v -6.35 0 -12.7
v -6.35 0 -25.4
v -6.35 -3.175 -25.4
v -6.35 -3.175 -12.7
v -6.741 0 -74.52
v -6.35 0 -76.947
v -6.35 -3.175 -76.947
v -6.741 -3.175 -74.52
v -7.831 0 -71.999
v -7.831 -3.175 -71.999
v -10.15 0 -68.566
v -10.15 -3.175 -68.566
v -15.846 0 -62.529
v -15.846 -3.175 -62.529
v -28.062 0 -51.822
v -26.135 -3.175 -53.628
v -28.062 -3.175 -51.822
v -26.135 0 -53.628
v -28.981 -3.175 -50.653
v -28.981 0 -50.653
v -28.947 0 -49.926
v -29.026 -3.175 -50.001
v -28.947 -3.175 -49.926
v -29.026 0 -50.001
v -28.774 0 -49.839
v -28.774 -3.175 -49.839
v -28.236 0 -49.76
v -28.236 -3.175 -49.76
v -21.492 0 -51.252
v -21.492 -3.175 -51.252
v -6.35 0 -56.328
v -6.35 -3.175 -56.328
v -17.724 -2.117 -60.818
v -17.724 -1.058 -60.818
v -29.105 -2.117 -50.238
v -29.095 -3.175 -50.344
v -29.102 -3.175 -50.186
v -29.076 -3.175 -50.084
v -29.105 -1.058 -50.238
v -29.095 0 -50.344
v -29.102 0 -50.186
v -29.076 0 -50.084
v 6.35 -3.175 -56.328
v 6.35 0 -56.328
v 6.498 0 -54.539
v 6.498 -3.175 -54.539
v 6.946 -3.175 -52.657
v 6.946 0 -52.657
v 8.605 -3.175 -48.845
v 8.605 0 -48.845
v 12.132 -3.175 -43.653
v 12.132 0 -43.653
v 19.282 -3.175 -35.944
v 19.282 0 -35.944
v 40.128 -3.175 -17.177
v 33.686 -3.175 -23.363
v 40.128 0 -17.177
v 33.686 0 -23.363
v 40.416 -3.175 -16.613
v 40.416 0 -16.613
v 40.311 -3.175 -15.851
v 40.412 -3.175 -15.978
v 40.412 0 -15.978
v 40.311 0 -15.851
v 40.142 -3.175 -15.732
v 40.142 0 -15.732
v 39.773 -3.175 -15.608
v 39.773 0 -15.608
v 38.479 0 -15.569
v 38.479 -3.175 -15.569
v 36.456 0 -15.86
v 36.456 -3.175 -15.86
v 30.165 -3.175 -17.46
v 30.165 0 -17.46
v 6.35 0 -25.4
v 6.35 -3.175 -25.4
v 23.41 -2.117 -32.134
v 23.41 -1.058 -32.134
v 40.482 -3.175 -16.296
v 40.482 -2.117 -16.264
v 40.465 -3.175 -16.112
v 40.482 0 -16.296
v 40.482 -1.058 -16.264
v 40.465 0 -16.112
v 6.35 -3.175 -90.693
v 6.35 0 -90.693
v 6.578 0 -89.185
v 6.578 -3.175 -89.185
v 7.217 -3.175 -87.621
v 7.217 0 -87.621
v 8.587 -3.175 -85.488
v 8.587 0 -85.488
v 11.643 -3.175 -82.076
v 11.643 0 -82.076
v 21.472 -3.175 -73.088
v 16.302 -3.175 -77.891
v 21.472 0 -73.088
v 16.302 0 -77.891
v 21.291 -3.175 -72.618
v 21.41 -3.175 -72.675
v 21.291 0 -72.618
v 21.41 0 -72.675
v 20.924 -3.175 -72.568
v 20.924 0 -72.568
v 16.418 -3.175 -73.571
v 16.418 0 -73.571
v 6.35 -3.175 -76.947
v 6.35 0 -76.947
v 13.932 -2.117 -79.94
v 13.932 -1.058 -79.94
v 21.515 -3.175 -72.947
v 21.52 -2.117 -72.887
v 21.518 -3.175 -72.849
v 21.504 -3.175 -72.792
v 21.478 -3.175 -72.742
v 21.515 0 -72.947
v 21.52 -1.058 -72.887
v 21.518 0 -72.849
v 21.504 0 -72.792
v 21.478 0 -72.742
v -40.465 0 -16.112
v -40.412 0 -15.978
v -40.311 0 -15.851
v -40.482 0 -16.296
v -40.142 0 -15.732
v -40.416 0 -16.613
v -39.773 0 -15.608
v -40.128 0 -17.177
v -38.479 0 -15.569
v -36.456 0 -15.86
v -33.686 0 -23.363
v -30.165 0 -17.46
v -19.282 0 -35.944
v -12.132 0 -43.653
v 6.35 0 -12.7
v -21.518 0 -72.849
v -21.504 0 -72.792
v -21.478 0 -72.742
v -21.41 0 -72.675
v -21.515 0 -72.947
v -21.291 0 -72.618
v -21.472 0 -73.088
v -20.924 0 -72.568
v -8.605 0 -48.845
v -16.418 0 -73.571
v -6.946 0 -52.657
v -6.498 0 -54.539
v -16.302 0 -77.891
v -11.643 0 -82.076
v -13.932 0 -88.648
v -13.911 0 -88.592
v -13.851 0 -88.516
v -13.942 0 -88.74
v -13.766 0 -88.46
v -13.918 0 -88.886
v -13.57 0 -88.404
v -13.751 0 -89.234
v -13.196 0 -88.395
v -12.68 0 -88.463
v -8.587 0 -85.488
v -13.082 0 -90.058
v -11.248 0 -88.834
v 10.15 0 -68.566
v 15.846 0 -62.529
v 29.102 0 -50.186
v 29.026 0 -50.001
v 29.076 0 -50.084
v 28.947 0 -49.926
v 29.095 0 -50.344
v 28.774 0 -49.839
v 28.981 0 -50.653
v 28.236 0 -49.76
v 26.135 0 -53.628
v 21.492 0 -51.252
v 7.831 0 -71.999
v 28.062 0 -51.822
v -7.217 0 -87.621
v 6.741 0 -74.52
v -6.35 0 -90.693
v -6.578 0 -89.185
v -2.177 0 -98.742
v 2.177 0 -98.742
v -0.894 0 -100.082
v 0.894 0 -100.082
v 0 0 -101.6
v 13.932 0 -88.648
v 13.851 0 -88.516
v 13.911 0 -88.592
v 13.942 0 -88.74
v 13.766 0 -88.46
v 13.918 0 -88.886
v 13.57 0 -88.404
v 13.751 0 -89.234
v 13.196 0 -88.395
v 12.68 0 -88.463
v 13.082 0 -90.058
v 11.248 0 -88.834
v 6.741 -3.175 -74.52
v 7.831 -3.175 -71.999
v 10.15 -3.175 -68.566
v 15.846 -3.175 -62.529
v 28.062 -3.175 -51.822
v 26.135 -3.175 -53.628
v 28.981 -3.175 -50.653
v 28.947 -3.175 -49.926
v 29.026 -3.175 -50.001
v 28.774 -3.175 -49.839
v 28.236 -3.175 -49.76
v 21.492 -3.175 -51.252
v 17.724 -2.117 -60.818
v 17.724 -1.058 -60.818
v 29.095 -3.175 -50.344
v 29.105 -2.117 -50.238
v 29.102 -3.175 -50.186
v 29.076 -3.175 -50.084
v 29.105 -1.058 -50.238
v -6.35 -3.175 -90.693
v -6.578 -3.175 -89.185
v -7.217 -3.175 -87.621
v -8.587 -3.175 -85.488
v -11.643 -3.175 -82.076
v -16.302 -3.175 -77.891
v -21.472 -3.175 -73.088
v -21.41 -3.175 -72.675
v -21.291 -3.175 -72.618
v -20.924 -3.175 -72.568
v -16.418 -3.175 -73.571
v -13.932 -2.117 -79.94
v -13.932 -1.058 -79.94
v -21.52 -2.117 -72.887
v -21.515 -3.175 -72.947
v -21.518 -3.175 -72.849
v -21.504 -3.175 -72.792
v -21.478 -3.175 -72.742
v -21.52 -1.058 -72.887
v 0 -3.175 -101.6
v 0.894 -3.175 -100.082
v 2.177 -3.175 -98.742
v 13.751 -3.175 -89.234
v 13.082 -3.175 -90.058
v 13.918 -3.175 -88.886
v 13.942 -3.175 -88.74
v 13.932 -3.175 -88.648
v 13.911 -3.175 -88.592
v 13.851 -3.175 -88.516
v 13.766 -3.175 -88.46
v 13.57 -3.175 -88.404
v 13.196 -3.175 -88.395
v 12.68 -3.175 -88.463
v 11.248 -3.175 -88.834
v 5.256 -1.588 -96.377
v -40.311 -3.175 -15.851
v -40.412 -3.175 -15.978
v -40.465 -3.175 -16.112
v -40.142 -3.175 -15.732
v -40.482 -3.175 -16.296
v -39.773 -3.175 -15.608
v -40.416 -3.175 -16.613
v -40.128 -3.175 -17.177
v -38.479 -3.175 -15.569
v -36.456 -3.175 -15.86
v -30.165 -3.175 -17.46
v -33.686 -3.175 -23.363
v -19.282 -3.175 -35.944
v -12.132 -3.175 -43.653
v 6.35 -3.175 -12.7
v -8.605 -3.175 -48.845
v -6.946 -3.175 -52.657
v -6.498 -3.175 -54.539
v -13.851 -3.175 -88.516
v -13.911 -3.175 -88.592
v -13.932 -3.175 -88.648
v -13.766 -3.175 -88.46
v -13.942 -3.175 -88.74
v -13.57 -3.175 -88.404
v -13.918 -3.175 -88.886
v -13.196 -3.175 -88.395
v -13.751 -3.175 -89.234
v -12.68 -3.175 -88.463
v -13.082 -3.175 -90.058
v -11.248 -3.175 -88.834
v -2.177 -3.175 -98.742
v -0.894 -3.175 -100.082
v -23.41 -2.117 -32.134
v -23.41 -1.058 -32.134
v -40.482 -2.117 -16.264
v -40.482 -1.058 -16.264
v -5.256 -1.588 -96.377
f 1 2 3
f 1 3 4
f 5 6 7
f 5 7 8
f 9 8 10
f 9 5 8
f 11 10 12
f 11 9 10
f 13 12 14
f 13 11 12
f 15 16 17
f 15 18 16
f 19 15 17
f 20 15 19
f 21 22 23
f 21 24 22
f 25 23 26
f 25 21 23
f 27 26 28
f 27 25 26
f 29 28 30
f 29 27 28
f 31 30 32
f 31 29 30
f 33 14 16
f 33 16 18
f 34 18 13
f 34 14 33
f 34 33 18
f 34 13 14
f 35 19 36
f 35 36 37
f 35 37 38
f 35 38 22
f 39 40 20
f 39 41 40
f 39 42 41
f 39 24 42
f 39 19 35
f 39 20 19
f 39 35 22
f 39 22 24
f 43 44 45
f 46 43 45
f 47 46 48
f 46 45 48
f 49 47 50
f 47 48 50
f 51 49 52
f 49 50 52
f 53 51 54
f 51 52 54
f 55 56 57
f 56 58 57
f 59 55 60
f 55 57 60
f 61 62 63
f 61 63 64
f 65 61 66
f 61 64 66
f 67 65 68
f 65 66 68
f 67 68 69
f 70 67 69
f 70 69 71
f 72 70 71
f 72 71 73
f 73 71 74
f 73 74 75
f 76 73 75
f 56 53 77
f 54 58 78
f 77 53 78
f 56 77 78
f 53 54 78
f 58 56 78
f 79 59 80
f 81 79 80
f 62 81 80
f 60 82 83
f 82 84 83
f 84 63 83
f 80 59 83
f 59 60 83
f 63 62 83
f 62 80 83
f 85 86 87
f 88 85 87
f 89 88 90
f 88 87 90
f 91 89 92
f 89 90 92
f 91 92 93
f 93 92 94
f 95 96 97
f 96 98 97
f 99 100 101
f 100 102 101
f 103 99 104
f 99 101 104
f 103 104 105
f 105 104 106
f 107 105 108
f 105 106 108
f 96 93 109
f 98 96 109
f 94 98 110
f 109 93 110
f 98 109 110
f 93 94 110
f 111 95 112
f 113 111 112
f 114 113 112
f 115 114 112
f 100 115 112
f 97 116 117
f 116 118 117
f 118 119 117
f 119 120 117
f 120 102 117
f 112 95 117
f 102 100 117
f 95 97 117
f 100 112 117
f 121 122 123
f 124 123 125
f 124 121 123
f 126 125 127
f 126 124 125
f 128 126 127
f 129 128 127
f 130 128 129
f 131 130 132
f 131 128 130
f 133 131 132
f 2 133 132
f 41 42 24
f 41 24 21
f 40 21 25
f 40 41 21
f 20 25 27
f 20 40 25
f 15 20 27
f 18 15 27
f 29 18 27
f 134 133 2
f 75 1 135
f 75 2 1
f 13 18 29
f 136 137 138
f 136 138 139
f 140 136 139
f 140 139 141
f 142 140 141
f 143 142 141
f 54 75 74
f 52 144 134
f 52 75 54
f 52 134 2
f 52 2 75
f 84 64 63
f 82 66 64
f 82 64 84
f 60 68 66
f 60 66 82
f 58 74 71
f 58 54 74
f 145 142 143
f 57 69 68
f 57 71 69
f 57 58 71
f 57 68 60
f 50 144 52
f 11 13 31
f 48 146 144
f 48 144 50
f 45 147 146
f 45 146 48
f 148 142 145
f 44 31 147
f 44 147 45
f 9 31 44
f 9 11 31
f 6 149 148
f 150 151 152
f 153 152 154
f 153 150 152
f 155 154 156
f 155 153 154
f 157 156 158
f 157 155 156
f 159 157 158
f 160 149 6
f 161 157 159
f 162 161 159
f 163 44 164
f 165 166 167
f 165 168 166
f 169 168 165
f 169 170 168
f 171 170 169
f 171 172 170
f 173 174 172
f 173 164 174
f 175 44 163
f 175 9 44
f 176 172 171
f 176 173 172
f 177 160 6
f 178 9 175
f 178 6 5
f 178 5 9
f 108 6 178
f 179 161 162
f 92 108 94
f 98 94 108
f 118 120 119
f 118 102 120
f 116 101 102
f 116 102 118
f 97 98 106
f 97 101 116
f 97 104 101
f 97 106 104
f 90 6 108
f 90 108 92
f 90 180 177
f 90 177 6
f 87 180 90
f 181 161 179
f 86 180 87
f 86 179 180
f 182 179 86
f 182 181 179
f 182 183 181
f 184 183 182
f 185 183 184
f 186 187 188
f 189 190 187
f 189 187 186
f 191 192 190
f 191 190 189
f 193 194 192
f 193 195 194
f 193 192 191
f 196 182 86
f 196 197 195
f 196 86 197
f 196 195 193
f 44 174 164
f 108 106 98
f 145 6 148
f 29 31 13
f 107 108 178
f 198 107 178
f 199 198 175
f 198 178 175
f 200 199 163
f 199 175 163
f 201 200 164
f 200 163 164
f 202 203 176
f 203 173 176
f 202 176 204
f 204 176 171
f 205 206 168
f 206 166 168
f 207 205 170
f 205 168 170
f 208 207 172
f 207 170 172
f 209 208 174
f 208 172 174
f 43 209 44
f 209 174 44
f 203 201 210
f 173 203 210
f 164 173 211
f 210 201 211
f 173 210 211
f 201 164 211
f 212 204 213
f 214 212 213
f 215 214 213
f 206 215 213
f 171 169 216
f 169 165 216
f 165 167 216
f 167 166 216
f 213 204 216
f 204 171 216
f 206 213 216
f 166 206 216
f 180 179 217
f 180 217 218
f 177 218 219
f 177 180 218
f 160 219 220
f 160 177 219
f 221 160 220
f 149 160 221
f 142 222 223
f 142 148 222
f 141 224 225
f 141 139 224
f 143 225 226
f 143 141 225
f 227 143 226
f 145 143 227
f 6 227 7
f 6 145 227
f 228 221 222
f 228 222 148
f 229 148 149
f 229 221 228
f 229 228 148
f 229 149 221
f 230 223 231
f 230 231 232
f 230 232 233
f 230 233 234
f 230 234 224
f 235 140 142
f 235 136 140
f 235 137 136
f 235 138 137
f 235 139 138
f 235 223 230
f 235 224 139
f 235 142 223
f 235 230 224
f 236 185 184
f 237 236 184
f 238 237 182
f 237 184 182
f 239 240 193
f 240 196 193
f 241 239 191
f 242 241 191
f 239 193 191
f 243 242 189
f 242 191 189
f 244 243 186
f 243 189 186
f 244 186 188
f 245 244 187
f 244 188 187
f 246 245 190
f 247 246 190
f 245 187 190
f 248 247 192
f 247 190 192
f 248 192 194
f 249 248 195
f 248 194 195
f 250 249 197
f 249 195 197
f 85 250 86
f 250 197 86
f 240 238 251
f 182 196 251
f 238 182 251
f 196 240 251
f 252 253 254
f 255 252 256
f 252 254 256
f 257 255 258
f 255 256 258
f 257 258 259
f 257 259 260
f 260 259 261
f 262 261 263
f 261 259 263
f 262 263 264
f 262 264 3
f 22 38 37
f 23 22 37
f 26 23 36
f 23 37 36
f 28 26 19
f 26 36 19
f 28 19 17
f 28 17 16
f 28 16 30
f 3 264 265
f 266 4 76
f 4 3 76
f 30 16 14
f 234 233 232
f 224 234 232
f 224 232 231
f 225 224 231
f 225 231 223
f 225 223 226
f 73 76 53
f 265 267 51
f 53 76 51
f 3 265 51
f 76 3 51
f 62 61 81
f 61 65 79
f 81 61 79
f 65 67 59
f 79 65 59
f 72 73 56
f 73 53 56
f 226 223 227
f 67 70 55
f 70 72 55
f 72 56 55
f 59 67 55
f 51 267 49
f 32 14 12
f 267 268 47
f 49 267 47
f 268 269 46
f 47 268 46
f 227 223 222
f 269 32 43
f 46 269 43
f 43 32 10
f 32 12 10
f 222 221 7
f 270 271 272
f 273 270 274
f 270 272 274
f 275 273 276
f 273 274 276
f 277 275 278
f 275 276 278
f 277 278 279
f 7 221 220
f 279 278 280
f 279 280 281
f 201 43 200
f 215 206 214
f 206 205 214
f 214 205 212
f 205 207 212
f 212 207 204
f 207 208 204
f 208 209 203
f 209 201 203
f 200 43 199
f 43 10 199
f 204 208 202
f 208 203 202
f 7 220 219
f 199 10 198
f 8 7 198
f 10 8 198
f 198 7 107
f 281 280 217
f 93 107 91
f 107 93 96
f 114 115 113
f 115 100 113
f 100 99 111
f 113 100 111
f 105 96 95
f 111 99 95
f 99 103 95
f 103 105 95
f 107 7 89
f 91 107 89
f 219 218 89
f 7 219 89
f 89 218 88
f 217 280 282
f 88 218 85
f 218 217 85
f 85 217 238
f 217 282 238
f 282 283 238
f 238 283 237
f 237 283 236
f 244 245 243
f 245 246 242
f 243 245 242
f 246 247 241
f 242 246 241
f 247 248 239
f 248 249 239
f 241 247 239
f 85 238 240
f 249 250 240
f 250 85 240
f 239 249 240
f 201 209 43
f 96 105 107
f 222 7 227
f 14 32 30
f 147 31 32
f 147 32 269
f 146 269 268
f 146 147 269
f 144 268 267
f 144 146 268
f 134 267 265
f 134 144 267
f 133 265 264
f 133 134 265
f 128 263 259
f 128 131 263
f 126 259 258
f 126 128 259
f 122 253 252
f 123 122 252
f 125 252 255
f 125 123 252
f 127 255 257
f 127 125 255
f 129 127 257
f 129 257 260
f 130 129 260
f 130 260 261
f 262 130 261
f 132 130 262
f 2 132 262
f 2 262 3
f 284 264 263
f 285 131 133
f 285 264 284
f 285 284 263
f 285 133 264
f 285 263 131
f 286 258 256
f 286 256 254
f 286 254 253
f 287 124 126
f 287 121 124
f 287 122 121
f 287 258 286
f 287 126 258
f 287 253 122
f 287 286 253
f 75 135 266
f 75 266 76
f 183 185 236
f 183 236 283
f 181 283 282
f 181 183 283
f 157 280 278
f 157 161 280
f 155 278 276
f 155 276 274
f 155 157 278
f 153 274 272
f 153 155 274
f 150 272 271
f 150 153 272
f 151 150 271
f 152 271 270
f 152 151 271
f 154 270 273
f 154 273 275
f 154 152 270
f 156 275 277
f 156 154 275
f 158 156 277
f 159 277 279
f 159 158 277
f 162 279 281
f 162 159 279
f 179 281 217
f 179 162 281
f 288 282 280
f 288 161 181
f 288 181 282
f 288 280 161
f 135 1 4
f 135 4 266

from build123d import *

# Parameters (mm, degrees)
BOSS_EXTRUDE1_DEPTH = 3.175


with BuildPart() as part:
    # Sketch1 → Boss-Extrude1 (new body)
    with BuildSketch(Plane(origin=(0, 0, 0), x_dir=(1, 0, 0), z_dir=(0, 1, 0))):
        with BuildLine():
            Line((-6.35, 12.7), (6.35, 12.7))
            Line((6.35, 12.7), (6.35, 25.4))
            add(Edge.make_bspline(
                [(6.35, 56.328313115), (6.33277042, 33.531169368), (83.156548095, -1.798073983), (6.35, 25.4)],
                knots=[0, 0, 0, 0, 1, 1, 1, 1], degree=3))
            add(Edge.make_bspline(
                [(6.35, 76.947188524), (6.338513613, 61.749092693), (57.554365397, 38.196263793), (6.35, 56.328313115)],
                knots=[0, 0, 0, 0, 1, 1, 1, 1], degree=3))
            add(Edge.make_bspline(
                [(6.35, 90.693105464), (6.342342409, 80.561041577), (40.486243598, 64.859155643), (6.35, 76.947188524)],
                knots=[0, 0, 0, 0, 1, 1, 1, 1], degree=3))
            add(Edge.make_bspline(
                [(0, 101.6), (0.859116351, 99.501641609), (8.04674624, 94.542823282), (20.625145946, 84.684563188), (6.35, 90.693105464)],
                knots=[0, 0, 0, 0, 0.27708829, 1, 1, 1, 1], degree=3))
            add(Edge.make_bspline(
                [(0, 101.6), (-0.859116351, 99.501641609), (-8.04674624, 94.542823282), (-20.625145946, 84.684563188), (-6.35, 90.693105464)],
                knots=[0, 0, 0, 0, 0.27708829, 1, 1, 1, 1], degree=3))
            add(Edge.make_bspline(
                [(-6.35, 90.693105464), (-6.342342409, 80.561041577), (-40.486243598, 64.859155643), (-6.35, 76.947188524)],
                knots=[0, 0, 0, 0, 1, 1, 1, 1], degree=3))
            add(Edge.make_bspline(
                [(-6.35, 76.947188524), (-6.338513613, 61.749092693), (-57.554365397, 38.196263793), (-6.35, 56.328313115)],
                knots=[0, 0, 0, 0, 1, 1, 1, 1], degree=3))
            add(Edge.make_bspline(
                [(-6.35, 56.328313115), (-6.33277042, 33.531169368), (-83.156548095, -1.798073983), (-6.35, 25.4)],
                knots=[0, 0, 0, 0, 1, 1, 1, 1], degree=3))
            Line((-6.35, 25.4), (-6.35, 12.7))
        make_face()
    extrude(amount=-BOSS_EXTRUDE1_DEPTH)


solid = part.part
